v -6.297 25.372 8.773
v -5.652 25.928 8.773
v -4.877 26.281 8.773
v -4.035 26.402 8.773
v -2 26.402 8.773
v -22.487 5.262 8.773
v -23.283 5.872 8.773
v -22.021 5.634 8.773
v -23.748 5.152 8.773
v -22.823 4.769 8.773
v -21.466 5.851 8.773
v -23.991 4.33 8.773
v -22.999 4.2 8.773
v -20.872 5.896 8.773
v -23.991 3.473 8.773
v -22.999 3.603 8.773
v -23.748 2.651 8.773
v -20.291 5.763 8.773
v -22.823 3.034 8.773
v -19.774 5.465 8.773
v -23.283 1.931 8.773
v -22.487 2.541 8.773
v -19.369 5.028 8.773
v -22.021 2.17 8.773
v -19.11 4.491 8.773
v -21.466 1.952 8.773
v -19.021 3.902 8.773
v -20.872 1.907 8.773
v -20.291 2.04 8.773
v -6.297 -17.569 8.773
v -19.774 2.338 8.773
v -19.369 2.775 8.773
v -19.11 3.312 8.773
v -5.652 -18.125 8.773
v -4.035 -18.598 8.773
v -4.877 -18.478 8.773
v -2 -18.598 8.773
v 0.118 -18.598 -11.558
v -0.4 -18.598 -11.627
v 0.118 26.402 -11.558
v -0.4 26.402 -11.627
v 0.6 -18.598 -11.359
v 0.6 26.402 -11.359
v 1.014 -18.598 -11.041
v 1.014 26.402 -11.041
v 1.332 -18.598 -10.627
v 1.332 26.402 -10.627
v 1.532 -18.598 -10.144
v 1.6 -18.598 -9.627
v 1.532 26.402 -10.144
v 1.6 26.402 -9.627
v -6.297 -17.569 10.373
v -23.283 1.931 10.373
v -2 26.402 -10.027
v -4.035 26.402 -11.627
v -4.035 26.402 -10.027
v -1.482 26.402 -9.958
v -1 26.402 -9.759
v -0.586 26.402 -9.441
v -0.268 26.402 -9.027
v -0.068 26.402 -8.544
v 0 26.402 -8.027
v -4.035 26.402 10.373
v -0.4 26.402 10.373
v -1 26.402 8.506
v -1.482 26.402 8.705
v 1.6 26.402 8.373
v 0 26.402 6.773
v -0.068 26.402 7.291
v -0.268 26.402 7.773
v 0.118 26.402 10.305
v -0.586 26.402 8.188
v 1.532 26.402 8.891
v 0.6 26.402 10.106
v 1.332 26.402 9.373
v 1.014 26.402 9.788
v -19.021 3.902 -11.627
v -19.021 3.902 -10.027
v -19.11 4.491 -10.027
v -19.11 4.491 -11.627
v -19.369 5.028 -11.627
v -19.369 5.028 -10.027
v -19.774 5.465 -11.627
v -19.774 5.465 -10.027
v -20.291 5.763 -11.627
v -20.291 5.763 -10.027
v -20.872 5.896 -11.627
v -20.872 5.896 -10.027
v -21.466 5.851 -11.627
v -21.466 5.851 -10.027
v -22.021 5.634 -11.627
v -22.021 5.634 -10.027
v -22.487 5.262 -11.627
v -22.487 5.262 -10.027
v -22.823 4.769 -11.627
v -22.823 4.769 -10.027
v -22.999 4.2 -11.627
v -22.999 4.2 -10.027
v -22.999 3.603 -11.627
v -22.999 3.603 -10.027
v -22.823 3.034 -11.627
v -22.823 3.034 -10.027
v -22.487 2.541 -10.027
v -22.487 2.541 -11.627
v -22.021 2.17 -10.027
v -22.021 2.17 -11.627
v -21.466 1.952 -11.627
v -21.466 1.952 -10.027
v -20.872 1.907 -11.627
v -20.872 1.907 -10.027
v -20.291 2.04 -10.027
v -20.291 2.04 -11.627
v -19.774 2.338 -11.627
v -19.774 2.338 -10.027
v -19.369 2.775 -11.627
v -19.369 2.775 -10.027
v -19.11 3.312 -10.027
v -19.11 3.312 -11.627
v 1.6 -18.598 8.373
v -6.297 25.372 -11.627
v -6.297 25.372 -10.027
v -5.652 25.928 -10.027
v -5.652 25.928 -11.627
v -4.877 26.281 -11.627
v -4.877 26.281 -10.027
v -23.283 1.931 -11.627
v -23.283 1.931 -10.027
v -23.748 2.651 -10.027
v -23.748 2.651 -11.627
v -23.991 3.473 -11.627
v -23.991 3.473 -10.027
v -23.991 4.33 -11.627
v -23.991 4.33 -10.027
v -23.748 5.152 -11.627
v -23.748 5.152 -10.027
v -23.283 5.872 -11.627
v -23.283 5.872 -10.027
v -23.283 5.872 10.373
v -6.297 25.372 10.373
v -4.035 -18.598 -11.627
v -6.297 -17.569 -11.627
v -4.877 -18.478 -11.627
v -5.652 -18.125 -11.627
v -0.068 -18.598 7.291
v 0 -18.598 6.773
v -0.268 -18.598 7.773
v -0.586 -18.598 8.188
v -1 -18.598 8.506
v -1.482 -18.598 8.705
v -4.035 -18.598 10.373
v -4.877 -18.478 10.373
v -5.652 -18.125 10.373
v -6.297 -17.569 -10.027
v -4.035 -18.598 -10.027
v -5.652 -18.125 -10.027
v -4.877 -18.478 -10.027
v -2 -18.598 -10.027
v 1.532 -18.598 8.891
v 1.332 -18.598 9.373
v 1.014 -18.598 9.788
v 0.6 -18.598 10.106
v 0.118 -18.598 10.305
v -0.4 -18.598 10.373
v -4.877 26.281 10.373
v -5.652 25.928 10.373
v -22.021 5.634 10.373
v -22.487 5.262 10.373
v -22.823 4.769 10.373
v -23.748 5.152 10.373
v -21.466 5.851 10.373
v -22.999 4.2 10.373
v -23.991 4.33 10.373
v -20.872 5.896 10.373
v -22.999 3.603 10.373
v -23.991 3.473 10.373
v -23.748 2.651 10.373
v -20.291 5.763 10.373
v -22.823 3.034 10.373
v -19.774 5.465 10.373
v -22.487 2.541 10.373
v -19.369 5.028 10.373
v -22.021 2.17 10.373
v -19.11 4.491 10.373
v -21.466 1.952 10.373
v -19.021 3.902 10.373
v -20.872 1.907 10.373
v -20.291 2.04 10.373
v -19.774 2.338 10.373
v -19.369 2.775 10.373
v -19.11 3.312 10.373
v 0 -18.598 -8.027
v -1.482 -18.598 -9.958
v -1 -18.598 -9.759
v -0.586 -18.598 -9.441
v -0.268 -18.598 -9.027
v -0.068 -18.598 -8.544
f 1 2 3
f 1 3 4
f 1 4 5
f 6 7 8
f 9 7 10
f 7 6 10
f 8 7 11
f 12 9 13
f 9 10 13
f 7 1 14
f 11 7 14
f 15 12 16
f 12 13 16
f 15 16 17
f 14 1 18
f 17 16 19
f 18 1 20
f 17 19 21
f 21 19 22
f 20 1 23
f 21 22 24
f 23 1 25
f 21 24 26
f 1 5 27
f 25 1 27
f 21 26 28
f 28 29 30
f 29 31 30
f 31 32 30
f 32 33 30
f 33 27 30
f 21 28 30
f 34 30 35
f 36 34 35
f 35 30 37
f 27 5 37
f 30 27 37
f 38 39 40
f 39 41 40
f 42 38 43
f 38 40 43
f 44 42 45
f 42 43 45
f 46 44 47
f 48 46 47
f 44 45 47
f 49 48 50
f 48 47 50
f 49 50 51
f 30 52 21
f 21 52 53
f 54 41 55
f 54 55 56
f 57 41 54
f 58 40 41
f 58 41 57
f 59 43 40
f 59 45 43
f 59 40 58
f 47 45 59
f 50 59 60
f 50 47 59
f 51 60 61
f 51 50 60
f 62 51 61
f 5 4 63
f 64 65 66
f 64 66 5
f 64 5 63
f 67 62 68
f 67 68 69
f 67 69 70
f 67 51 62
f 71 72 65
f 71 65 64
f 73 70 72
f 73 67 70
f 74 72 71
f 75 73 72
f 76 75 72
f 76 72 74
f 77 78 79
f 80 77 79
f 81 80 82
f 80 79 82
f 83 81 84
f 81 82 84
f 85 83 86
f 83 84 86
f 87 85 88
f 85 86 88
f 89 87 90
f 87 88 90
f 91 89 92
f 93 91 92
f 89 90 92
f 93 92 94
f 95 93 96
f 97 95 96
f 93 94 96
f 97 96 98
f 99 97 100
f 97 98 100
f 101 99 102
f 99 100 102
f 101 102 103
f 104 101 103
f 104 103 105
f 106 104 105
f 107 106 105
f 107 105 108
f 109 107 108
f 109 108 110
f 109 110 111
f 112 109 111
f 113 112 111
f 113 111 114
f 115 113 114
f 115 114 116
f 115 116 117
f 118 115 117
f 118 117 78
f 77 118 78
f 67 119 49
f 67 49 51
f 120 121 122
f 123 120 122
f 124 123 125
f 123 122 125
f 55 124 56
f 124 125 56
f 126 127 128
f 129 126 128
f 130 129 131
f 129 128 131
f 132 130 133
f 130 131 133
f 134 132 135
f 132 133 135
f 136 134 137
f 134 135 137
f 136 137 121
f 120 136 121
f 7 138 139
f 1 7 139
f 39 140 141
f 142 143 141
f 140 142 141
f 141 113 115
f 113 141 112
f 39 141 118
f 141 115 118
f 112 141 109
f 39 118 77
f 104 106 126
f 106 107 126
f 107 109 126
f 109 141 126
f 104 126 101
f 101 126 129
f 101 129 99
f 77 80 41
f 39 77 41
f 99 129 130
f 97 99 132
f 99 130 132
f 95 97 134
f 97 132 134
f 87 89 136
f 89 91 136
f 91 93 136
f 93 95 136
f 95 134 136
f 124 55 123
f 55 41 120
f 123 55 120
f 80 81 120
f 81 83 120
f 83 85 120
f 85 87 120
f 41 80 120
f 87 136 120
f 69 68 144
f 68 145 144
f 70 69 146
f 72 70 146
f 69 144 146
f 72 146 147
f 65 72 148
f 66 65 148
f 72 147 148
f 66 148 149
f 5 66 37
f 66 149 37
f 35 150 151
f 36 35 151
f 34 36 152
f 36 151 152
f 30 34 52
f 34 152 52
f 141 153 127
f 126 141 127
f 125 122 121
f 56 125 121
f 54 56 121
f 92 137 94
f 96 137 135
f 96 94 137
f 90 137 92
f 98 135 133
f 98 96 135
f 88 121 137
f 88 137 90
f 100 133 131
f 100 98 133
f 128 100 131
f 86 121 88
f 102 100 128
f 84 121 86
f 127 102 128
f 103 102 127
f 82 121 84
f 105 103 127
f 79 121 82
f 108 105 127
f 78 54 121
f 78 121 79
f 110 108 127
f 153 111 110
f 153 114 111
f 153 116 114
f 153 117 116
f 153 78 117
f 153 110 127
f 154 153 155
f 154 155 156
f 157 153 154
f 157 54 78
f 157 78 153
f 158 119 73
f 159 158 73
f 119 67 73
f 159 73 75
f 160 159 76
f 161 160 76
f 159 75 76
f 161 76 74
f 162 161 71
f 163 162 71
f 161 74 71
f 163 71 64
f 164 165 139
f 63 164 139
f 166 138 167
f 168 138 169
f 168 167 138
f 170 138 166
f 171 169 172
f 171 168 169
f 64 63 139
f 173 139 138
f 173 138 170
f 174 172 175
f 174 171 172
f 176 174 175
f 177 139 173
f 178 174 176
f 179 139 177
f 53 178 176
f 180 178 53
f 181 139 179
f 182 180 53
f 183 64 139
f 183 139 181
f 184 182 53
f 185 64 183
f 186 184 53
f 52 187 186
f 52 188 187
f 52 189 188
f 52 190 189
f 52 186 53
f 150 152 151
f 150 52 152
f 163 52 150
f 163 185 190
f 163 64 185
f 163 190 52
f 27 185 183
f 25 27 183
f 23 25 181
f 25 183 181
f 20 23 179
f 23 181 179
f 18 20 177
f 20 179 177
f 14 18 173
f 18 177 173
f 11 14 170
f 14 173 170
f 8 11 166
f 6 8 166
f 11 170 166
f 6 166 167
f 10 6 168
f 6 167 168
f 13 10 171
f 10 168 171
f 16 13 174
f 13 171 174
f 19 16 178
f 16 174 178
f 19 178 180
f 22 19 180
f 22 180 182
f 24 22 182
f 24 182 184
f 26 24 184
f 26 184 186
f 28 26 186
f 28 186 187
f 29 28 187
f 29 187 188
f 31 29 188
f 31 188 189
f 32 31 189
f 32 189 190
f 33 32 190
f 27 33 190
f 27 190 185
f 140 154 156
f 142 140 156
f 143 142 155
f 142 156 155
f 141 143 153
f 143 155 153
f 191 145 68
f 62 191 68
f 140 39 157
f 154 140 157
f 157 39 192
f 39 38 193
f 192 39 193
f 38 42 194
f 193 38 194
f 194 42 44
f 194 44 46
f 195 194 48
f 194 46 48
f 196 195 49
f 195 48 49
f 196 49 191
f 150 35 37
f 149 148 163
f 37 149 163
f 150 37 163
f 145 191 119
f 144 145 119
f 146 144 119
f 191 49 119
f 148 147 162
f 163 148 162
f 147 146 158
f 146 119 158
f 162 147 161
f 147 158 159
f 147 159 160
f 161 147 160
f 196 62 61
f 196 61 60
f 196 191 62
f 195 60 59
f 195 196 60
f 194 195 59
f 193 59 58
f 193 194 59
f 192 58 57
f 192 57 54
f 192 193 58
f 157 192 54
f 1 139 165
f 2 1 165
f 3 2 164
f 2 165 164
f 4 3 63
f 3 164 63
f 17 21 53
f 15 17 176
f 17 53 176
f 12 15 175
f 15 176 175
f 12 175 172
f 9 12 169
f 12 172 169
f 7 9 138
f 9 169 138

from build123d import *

# Parameters (mm, degrees)
F0_W     = 45
F0_H     = 22
F1_DEPTH = 1.6
F2_W     = 45
F2_H     = 1.6
F3_DEPTH = 25
F4_R     = 2
F5_DEPTH = 25
F6_R     = 2


with BuildPart() as f1:
    # F0 (on Right) → F1 (new body)
    with BuildSketch(Plane.YZ):
        with Locations((3.901578, -0.626537)):
            Rectangle(F0_W, F0_H)
    extrude(amount=F1_DEPTH)

    # F2 (on face) → F3 (join)
    with BuildSketch(Plane(origin=(0, 0, 0), x_dir=(0, -1, 0), z_dir=(-1, 0, 0))):
        with Locations((-3.901578, 9.573463)):
            Rectangle(F2_W, F2_H)
        with Locations((-3.901578, -10.826537)):
            Rectangle(F2_W, F2_H)
    extrude(amount=F3_DEPTH)

    # F4 (on face) → F5 (cut)
    with BuildSketch(Plane.XY.offset(10.373463)):
        with BuildLine():
            Line((-25, -18.598422), (-4.034702, -18.598422))
            ThreePointArc((-4.034702, -18.598422), (-5.277364, -18.328951), (-6.296786, -17.568949))
            Line((-6.296786, -17.568949), (-23.283452, 1.931051))
            ThreePointArc((-23.283452, 1.931051), (-24.021368, 3.901578), (-23.283452, 5.872105))
            Line((-23.283452, 5.872105), (-6.296786, 25.372105))
            ThreePointArc((-6.296786, 25.372105), (-5.277364, 26.132107), (-4.034702, 26.401578))
            Line((-4.034702, 26.401578), (-25, 26.401578))
            Line((-25, 26.401578), (-25, -18.598422))
        make_face()
        with Locations((-21.021368, 3.901578)):
            Circle(F4_R)
    extrude(amount=-F5_DEPTH, mode=Mode.SUBTRACT)

    # F6
    f6_edges = [f1.edges().sort_by_distance(p)[0] for p in [
        (1.6, 3.901578, -11.626537),
        (1.6, 3.901578, 10.373463),
        (0, 3.901578, -10.026537),
        (0, 3.901578, 8.773463),
    ]]
    fillet(f6_edges, radius=F6_R)


solid = f1.part
